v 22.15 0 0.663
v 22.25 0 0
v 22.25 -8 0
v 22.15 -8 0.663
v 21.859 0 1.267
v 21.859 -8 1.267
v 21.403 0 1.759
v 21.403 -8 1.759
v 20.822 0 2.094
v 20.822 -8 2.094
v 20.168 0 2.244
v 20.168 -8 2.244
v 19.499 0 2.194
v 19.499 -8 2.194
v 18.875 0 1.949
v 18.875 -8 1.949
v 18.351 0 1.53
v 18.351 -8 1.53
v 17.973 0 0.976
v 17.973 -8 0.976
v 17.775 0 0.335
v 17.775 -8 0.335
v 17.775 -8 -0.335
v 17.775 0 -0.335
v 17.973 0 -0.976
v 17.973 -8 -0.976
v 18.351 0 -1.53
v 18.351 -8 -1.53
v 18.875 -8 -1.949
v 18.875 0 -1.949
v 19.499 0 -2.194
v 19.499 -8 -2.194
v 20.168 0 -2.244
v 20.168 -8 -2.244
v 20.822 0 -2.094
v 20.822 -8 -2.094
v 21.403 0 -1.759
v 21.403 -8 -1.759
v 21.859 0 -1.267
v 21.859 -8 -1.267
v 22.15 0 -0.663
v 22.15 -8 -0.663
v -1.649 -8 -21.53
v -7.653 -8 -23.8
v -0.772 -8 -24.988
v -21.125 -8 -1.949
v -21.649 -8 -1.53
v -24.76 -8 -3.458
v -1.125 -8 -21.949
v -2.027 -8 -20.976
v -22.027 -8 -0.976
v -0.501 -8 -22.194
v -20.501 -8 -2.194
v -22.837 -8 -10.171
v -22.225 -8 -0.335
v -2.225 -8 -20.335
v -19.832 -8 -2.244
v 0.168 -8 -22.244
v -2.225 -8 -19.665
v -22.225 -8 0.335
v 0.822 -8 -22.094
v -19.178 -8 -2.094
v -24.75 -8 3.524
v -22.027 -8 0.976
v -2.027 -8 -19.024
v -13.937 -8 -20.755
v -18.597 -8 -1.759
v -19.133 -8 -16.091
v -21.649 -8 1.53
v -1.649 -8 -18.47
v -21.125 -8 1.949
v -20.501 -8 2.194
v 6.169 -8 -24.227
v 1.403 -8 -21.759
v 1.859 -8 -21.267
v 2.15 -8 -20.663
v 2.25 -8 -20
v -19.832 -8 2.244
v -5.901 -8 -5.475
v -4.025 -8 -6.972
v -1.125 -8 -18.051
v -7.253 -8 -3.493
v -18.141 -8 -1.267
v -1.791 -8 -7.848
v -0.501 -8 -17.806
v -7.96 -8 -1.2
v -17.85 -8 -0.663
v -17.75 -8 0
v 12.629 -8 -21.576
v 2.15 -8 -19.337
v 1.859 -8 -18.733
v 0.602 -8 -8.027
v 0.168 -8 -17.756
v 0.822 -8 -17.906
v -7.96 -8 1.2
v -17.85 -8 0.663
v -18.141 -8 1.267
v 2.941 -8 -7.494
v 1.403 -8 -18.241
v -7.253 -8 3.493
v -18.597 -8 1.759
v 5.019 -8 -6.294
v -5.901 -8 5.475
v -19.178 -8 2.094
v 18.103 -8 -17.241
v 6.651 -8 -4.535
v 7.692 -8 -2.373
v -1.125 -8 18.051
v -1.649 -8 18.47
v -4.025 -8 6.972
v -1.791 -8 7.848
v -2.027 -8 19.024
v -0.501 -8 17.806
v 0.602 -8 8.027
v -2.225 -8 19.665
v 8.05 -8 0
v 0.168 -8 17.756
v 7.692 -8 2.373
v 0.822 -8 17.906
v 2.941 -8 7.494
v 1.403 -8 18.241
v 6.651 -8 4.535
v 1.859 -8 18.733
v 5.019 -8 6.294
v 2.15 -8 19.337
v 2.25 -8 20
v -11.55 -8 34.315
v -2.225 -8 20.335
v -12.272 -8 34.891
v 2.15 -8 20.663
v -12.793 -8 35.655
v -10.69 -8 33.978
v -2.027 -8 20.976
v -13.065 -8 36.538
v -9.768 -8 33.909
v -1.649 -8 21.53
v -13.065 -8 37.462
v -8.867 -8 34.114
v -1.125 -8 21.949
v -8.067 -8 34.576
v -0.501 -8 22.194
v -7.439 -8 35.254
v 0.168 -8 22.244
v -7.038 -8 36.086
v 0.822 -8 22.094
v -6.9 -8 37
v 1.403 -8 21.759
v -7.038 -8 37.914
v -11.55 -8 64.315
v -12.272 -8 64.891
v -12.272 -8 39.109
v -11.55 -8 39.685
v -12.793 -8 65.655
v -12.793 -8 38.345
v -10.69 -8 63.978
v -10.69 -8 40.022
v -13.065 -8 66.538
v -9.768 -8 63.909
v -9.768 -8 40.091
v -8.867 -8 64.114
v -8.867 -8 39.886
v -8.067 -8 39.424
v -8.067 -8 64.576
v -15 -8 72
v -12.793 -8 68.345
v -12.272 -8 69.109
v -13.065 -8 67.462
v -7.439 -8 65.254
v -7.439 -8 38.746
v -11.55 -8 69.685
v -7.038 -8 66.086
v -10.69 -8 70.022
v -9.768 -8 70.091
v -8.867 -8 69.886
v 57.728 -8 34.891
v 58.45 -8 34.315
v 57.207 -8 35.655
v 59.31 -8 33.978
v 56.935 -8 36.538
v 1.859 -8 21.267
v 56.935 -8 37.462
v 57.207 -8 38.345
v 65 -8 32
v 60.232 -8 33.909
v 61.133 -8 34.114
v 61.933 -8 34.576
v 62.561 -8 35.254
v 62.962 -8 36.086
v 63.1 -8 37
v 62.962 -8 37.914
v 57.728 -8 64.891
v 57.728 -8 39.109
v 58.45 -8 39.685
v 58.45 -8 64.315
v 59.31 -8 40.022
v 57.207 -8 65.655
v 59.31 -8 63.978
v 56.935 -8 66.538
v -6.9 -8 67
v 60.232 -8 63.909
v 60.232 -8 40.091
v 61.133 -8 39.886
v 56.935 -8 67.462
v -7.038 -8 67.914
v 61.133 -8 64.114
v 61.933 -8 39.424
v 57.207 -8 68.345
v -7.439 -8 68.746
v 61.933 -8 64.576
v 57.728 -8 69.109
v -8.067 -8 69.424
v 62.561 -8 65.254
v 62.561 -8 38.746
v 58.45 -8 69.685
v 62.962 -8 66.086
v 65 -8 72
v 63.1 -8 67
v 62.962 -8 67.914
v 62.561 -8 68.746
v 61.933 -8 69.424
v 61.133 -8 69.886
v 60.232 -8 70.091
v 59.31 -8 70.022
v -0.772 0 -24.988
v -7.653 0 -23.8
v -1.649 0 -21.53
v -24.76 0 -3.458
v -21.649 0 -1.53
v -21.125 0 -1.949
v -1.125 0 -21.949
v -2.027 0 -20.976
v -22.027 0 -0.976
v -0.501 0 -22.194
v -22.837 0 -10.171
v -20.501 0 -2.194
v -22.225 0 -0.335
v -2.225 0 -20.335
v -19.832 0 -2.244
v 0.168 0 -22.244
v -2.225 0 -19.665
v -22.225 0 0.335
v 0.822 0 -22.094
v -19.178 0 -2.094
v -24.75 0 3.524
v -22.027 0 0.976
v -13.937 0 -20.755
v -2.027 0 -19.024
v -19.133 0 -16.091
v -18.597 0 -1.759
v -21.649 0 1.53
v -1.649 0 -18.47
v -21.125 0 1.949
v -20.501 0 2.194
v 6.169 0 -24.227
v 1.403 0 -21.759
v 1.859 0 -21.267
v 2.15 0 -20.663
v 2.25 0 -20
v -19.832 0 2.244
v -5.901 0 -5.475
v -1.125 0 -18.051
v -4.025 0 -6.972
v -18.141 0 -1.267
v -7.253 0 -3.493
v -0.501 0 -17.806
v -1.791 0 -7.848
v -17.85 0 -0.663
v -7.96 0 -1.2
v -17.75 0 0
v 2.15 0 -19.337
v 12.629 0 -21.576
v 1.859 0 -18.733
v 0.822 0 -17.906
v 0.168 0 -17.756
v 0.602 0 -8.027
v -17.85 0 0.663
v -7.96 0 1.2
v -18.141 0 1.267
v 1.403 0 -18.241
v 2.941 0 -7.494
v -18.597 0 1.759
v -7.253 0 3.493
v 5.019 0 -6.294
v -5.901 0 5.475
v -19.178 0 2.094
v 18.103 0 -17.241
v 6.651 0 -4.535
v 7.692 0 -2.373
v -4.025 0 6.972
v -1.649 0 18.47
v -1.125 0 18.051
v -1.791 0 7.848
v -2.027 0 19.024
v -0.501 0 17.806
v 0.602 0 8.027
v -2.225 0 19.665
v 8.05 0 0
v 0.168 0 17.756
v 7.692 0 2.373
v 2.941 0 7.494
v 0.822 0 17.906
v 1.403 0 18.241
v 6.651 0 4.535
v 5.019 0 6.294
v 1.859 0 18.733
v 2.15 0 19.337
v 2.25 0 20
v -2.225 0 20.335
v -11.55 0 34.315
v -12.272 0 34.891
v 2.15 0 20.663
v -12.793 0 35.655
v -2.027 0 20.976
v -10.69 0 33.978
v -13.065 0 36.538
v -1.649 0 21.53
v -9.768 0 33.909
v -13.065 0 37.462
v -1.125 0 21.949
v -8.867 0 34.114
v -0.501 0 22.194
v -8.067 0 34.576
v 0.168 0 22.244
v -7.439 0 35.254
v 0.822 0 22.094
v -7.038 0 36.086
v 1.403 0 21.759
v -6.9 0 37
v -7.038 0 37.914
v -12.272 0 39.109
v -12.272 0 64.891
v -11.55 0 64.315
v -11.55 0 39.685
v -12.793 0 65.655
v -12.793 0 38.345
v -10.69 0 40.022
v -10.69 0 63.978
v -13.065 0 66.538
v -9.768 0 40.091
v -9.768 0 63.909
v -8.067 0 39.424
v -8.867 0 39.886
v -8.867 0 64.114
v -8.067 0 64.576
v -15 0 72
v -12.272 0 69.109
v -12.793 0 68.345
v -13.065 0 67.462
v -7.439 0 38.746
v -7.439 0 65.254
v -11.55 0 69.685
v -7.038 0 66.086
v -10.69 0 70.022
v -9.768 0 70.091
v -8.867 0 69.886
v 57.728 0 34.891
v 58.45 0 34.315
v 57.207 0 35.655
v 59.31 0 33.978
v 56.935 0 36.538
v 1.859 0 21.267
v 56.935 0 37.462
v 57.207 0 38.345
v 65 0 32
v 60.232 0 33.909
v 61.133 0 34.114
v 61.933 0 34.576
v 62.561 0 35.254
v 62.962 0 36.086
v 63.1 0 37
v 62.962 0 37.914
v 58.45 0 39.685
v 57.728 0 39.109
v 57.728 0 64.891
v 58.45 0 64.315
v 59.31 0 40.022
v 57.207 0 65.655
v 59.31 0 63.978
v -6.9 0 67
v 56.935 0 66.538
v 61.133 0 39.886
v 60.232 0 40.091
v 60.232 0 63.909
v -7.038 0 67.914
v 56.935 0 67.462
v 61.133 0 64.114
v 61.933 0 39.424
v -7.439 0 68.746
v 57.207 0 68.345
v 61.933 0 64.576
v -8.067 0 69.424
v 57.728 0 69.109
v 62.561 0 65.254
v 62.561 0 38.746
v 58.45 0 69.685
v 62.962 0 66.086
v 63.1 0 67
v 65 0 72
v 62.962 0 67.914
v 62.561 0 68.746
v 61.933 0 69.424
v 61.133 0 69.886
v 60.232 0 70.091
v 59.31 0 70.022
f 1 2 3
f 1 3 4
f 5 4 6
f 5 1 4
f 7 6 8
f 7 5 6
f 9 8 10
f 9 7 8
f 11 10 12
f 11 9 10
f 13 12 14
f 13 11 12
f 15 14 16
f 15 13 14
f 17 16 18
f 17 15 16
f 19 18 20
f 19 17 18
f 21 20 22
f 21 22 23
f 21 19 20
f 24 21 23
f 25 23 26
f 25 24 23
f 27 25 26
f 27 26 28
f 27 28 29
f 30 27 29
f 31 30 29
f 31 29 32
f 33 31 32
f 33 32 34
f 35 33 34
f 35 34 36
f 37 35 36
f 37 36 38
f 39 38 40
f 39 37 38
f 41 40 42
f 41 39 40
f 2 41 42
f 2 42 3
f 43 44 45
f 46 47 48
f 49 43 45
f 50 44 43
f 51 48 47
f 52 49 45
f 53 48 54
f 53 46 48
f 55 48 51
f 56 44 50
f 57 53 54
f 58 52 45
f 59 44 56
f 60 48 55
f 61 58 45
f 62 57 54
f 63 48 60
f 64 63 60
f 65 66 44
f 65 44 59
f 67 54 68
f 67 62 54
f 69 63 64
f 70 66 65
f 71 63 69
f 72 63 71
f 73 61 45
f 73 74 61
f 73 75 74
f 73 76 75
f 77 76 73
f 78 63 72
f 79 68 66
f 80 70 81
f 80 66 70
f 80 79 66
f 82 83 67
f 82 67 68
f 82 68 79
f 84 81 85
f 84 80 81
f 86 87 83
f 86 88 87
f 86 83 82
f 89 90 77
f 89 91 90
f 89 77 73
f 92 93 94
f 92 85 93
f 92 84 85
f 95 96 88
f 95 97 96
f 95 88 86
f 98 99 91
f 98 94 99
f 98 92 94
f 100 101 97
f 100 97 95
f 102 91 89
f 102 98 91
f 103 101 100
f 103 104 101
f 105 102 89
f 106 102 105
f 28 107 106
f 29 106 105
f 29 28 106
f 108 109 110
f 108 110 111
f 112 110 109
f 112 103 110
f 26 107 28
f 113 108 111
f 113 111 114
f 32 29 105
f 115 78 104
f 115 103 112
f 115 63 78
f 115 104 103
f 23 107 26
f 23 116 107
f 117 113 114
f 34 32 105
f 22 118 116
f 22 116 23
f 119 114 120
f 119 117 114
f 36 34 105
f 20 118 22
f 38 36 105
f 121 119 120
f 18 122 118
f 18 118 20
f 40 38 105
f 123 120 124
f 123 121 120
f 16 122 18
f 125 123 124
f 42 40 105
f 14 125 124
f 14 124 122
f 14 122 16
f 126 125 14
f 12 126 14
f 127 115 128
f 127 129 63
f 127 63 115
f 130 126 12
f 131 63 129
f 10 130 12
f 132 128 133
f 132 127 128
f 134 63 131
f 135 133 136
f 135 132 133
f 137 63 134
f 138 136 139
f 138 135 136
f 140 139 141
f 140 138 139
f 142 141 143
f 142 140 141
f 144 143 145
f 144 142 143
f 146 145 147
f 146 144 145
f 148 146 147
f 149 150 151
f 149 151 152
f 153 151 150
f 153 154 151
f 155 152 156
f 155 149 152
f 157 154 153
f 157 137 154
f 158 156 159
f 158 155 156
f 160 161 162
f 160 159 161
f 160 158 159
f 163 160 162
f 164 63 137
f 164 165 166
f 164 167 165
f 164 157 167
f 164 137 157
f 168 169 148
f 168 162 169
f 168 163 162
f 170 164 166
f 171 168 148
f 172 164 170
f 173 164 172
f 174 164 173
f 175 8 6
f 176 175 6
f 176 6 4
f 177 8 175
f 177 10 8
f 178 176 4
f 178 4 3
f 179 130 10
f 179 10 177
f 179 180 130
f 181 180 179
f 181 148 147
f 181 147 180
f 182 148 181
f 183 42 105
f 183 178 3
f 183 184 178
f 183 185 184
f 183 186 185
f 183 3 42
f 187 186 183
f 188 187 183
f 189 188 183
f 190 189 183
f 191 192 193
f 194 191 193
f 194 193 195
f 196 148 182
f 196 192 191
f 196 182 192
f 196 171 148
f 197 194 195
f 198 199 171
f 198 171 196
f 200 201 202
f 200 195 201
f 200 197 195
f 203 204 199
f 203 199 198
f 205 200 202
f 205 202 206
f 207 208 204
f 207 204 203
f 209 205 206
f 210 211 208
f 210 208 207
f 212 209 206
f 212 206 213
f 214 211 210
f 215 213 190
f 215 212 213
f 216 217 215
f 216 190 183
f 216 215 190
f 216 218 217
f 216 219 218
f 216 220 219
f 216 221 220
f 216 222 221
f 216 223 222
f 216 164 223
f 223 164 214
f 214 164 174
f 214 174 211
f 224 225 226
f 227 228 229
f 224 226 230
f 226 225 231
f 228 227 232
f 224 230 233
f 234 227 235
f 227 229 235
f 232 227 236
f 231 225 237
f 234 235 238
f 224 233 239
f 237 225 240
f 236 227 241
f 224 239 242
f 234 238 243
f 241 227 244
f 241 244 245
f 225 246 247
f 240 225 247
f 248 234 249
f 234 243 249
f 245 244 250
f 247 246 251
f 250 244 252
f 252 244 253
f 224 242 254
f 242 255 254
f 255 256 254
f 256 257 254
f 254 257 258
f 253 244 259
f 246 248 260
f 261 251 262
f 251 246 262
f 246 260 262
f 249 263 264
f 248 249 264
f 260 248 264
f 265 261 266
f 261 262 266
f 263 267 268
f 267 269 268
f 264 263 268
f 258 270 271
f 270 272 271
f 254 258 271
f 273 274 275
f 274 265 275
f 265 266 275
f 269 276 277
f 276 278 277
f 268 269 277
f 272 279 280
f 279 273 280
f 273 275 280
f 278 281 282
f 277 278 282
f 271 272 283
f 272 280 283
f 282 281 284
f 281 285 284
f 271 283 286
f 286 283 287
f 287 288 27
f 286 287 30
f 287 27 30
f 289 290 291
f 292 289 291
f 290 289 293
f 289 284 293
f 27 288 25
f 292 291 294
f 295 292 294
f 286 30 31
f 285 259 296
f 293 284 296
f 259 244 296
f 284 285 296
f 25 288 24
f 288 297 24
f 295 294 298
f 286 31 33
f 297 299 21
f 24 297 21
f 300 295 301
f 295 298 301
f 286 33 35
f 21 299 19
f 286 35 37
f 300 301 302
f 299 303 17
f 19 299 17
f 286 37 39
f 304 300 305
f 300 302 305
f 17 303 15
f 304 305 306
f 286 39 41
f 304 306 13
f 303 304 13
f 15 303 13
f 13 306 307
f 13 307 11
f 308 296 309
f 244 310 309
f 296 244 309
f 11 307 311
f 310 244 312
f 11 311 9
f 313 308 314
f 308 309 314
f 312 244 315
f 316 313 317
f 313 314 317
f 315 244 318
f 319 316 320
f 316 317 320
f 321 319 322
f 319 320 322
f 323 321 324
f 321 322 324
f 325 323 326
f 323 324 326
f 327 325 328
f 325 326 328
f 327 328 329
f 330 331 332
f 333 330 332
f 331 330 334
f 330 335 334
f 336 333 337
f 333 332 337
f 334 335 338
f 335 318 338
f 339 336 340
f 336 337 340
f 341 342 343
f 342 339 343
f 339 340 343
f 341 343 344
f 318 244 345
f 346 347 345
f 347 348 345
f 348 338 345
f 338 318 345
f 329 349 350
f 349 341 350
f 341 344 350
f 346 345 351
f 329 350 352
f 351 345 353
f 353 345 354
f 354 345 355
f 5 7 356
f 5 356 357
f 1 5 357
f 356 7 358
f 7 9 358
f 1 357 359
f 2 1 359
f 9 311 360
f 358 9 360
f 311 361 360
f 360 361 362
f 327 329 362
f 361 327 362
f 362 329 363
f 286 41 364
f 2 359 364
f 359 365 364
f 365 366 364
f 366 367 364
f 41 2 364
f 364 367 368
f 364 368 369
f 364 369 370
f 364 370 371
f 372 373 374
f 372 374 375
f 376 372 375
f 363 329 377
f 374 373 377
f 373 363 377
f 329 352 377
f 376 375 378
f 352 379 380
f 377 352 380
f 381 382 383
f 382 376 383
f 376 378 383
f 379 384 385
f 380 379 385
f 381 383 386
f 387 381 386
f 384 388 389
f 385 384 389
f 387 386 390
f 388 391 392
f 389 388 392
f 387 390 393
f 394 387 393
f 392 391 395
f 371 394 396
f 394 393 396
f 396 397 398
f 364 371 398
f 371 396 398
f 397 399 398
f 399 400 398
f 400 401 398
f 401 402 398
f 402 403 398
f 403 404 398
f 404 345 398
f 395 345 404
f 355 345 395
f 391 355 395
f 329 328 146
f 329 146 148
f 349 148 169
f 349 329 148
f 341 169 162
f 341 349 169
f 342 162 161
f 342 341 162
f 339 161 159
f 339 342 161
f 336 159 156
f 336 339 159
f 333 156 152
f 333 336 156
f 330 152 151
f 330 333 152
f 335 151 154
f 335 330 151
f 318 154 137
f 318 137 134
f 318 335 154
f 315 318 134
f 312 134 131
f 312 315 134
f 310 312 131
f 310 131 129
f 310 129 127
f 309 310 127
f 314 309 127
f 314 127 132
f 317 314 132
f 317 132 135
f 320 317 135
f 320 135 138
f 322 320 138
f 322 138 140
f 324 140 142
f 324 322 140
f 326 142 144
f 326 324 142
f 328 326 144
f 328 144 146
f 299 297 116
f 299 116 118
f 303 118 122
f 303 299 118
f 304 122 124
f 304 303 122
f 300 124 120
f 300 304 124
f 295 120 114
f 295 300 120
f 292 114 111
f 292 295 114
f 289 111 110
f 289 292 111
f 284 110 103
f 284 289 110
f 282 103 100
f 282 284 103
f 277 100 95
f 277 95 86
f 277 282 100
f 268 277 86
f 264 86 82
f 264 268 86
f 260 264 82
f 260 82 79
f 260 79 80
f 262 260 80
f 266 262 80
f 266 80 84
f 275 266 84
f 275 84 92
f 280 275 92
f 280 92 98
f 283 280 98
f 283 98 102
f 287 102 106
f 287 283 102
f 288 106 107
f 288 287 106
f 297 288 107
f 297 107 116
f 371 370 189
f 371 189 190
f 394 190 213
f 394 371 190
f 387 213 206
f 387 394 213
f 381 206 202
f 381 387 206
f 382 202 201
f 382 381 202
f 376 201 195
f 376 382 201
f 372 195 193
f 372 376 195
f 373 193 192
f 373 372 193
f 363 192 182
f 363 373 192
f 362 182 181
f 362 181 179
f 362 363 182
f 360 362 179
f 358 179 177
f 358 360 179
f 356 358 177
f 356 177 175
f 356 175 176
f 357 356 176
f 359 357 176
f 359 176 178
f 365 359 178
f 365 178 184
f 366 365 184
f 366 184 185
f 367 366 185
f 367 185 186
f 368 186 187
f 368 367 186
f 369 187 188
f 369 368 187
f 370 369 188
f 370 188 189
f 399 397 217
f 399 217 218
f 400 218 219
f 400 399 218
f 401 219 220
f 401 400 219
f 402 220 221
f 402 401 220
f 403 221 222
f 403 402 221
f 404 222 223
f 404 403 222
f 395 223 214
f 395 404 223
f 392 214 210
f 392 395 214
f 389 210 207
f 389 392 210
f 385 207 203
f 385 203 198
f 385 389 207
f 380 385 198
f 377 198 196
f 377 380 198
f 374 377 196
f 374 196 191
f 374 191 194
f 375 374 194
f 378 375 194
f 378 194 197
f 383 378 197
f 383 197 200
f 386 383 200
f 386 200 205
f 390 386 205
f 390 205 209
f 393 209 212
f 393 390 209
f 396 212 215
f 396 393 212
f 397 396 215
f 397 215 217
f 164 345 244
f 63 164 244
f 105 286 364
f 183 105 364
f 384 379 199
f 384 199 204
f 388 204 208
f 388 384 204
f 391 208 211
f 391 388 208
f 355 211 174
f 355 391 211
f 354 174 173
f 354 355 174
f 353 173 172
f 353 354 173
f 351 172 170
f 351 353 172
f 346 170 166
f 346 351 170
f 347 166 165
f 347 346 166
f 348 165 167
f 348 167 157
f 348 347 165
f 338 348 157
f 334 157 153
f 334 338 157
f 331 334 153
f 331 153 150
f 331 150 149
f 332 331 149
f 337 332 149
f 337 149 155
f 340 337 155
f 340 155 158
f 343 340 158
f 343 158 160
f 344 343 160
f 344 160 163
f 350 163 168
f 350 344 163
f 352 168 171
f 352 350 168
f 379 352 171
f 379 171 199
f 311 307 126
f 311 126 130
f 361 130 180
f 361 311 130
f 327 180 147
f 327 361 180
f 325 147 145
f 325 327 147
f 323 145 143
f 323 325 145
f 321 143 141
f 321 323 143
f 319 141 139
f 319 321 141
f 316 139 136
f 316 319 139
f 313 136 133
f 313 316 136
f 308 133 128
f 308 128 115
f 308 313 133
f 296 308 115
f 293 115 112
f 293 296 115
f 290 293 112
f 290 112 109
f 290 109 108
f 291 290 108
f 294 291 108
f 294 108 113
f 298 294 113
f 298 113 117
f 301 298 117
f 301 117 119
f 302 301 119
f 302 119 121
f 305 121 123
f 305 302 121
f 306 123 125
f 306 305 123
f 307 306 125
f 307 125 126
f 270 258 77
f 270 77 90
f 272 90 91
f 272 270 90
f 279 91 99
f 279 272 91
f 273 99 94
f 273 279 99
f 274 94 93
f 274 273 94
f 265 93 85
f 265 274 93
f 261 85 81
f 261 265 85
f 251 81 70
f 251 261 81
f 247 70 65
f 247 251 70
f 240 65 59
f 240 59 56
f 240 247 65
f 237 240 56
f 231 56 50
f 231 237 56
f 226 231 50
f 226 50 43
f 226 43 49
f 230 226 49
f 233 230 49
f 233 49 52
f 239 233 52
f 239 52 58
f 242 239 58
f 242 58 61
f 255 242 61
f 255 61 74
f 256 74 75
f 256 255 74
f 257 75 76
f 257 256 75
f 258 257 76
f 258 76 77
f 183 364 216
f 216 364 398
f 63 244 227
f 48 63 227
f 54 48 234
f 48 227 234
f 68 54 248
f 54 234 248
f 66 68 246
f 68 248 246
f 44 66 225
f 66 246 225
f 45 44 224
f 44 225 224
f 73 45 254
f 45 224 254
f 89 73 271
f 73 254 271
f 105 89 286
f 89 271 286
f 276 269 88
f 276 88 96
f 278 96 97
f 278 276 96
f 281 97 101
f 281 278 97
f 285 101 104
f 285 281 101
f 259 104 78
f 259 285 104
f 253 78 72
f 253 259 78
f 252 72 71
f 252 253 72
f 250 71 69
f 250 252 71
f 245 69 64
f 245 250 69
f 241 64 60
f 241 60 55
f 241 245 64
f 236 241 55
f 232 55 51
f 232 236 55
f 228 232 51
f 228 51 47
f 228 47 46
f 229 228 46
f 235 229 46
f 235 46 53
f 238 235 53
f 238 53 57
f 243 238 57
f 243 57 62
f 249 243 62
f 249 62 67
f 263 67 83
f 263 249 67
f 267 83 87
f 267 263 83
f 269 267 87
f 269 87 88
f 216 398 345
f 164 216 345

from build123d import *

# Parameters (mm, degrees)
F0_R     = 2.25
F0_R_2   = 8.05
F0_R_3   = 3.1
F1_DEPTH = 8


with BuildPart() as f1:
    # F0 (on Front) → F1 (new body)
    with BuildSketch(Plane.XZ):
        with BuildLine():
            Line((65, 72), (-15, 72))
            Line((-15, 72), (-24.750349, 3.524233))
            ThreePointArc((-24.750349, 3.524233), (-10.901742, -22.497822), (18.103448, -17.241379))
            Line((18.103448, -17.241379), (65, 32))
            Line((65, 32), (65, 72))
        make_face()
        with Locations((0, -20)):
            Circle(F0_R, mode=Mode.SUBTRACT)
        with Locations((-20, 0)):
            Circle(F0_R, mode=Mode.SUBTRACT)
        Circle(F0_R_2, mode=Mode.SUBTRACT)
        with Locations((0, 20)):
            Circle(F0_R, mode=Mode.SUBTRACT)
        with Locations((20, 0)):
            Circle(F0_R, mode=Mode.SUBTRACT)
        with Locations((-10, 37)):
            Circle(F0_R_3, mode=Mode.SUBTRACT)
        with Locations((-10, 67)):
            Circle(F0_R_3, mode=Mode.SUBTRACT)
        with Locations((60, 37)):
            Circle(F0_R_3, mode=Mode.SUBTRACT)
        with Locations((60, 67)):
            Circle(F0_R_3, mode=Mode.SUBTRACT)
    extrude(amount=F1_DEPTH)


solid = f1.part
